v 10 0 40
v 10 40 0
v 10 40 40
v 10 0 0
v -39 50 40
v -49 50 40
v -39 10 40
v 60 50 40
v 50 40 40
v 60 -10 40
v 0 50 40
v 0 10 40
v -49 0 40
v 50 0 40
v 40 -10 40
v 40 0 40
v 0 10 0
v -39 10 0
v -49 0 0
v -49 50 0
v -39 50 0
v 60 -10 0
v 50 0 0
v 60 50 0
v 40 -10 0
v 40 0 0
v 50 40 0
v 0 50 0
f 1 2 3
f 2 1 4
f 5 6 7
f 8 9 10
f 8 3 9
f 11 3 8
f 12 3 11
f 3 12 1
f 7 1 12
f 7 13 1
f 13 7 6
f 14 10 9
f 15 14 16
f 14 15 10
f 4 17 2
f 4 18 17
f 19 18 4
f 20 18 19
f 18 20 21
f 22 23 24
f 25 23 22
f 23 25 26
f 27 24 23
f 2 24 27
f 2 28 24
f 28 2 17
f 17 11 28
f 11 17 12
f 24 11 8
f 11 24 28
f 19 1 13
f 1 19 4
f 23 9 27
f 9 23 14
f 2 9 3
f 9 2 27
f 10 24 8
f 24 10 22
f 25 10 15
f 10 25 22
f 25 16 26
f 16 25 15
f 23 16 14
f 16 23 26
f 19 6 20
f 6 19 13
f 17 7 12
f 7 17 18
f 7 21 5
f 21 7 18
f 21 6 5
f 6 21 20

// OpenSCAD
deskwidth = 39;
module deskhook()
{
	cube([10,50,40]);
	translate([10,40,0]) cube([40,10,40]);
	translate([50,-10,0]) cube([10,60,40]);
	translate([40,-10,0]) cube([10,10,40]);
	translate([-1*(deskwidth+10),0,0]) cube([deskwidth+10,10,40]);
	translate([-1*(deskwidth+10),10,0])cube([10,40,40]);
}
deskhook();
